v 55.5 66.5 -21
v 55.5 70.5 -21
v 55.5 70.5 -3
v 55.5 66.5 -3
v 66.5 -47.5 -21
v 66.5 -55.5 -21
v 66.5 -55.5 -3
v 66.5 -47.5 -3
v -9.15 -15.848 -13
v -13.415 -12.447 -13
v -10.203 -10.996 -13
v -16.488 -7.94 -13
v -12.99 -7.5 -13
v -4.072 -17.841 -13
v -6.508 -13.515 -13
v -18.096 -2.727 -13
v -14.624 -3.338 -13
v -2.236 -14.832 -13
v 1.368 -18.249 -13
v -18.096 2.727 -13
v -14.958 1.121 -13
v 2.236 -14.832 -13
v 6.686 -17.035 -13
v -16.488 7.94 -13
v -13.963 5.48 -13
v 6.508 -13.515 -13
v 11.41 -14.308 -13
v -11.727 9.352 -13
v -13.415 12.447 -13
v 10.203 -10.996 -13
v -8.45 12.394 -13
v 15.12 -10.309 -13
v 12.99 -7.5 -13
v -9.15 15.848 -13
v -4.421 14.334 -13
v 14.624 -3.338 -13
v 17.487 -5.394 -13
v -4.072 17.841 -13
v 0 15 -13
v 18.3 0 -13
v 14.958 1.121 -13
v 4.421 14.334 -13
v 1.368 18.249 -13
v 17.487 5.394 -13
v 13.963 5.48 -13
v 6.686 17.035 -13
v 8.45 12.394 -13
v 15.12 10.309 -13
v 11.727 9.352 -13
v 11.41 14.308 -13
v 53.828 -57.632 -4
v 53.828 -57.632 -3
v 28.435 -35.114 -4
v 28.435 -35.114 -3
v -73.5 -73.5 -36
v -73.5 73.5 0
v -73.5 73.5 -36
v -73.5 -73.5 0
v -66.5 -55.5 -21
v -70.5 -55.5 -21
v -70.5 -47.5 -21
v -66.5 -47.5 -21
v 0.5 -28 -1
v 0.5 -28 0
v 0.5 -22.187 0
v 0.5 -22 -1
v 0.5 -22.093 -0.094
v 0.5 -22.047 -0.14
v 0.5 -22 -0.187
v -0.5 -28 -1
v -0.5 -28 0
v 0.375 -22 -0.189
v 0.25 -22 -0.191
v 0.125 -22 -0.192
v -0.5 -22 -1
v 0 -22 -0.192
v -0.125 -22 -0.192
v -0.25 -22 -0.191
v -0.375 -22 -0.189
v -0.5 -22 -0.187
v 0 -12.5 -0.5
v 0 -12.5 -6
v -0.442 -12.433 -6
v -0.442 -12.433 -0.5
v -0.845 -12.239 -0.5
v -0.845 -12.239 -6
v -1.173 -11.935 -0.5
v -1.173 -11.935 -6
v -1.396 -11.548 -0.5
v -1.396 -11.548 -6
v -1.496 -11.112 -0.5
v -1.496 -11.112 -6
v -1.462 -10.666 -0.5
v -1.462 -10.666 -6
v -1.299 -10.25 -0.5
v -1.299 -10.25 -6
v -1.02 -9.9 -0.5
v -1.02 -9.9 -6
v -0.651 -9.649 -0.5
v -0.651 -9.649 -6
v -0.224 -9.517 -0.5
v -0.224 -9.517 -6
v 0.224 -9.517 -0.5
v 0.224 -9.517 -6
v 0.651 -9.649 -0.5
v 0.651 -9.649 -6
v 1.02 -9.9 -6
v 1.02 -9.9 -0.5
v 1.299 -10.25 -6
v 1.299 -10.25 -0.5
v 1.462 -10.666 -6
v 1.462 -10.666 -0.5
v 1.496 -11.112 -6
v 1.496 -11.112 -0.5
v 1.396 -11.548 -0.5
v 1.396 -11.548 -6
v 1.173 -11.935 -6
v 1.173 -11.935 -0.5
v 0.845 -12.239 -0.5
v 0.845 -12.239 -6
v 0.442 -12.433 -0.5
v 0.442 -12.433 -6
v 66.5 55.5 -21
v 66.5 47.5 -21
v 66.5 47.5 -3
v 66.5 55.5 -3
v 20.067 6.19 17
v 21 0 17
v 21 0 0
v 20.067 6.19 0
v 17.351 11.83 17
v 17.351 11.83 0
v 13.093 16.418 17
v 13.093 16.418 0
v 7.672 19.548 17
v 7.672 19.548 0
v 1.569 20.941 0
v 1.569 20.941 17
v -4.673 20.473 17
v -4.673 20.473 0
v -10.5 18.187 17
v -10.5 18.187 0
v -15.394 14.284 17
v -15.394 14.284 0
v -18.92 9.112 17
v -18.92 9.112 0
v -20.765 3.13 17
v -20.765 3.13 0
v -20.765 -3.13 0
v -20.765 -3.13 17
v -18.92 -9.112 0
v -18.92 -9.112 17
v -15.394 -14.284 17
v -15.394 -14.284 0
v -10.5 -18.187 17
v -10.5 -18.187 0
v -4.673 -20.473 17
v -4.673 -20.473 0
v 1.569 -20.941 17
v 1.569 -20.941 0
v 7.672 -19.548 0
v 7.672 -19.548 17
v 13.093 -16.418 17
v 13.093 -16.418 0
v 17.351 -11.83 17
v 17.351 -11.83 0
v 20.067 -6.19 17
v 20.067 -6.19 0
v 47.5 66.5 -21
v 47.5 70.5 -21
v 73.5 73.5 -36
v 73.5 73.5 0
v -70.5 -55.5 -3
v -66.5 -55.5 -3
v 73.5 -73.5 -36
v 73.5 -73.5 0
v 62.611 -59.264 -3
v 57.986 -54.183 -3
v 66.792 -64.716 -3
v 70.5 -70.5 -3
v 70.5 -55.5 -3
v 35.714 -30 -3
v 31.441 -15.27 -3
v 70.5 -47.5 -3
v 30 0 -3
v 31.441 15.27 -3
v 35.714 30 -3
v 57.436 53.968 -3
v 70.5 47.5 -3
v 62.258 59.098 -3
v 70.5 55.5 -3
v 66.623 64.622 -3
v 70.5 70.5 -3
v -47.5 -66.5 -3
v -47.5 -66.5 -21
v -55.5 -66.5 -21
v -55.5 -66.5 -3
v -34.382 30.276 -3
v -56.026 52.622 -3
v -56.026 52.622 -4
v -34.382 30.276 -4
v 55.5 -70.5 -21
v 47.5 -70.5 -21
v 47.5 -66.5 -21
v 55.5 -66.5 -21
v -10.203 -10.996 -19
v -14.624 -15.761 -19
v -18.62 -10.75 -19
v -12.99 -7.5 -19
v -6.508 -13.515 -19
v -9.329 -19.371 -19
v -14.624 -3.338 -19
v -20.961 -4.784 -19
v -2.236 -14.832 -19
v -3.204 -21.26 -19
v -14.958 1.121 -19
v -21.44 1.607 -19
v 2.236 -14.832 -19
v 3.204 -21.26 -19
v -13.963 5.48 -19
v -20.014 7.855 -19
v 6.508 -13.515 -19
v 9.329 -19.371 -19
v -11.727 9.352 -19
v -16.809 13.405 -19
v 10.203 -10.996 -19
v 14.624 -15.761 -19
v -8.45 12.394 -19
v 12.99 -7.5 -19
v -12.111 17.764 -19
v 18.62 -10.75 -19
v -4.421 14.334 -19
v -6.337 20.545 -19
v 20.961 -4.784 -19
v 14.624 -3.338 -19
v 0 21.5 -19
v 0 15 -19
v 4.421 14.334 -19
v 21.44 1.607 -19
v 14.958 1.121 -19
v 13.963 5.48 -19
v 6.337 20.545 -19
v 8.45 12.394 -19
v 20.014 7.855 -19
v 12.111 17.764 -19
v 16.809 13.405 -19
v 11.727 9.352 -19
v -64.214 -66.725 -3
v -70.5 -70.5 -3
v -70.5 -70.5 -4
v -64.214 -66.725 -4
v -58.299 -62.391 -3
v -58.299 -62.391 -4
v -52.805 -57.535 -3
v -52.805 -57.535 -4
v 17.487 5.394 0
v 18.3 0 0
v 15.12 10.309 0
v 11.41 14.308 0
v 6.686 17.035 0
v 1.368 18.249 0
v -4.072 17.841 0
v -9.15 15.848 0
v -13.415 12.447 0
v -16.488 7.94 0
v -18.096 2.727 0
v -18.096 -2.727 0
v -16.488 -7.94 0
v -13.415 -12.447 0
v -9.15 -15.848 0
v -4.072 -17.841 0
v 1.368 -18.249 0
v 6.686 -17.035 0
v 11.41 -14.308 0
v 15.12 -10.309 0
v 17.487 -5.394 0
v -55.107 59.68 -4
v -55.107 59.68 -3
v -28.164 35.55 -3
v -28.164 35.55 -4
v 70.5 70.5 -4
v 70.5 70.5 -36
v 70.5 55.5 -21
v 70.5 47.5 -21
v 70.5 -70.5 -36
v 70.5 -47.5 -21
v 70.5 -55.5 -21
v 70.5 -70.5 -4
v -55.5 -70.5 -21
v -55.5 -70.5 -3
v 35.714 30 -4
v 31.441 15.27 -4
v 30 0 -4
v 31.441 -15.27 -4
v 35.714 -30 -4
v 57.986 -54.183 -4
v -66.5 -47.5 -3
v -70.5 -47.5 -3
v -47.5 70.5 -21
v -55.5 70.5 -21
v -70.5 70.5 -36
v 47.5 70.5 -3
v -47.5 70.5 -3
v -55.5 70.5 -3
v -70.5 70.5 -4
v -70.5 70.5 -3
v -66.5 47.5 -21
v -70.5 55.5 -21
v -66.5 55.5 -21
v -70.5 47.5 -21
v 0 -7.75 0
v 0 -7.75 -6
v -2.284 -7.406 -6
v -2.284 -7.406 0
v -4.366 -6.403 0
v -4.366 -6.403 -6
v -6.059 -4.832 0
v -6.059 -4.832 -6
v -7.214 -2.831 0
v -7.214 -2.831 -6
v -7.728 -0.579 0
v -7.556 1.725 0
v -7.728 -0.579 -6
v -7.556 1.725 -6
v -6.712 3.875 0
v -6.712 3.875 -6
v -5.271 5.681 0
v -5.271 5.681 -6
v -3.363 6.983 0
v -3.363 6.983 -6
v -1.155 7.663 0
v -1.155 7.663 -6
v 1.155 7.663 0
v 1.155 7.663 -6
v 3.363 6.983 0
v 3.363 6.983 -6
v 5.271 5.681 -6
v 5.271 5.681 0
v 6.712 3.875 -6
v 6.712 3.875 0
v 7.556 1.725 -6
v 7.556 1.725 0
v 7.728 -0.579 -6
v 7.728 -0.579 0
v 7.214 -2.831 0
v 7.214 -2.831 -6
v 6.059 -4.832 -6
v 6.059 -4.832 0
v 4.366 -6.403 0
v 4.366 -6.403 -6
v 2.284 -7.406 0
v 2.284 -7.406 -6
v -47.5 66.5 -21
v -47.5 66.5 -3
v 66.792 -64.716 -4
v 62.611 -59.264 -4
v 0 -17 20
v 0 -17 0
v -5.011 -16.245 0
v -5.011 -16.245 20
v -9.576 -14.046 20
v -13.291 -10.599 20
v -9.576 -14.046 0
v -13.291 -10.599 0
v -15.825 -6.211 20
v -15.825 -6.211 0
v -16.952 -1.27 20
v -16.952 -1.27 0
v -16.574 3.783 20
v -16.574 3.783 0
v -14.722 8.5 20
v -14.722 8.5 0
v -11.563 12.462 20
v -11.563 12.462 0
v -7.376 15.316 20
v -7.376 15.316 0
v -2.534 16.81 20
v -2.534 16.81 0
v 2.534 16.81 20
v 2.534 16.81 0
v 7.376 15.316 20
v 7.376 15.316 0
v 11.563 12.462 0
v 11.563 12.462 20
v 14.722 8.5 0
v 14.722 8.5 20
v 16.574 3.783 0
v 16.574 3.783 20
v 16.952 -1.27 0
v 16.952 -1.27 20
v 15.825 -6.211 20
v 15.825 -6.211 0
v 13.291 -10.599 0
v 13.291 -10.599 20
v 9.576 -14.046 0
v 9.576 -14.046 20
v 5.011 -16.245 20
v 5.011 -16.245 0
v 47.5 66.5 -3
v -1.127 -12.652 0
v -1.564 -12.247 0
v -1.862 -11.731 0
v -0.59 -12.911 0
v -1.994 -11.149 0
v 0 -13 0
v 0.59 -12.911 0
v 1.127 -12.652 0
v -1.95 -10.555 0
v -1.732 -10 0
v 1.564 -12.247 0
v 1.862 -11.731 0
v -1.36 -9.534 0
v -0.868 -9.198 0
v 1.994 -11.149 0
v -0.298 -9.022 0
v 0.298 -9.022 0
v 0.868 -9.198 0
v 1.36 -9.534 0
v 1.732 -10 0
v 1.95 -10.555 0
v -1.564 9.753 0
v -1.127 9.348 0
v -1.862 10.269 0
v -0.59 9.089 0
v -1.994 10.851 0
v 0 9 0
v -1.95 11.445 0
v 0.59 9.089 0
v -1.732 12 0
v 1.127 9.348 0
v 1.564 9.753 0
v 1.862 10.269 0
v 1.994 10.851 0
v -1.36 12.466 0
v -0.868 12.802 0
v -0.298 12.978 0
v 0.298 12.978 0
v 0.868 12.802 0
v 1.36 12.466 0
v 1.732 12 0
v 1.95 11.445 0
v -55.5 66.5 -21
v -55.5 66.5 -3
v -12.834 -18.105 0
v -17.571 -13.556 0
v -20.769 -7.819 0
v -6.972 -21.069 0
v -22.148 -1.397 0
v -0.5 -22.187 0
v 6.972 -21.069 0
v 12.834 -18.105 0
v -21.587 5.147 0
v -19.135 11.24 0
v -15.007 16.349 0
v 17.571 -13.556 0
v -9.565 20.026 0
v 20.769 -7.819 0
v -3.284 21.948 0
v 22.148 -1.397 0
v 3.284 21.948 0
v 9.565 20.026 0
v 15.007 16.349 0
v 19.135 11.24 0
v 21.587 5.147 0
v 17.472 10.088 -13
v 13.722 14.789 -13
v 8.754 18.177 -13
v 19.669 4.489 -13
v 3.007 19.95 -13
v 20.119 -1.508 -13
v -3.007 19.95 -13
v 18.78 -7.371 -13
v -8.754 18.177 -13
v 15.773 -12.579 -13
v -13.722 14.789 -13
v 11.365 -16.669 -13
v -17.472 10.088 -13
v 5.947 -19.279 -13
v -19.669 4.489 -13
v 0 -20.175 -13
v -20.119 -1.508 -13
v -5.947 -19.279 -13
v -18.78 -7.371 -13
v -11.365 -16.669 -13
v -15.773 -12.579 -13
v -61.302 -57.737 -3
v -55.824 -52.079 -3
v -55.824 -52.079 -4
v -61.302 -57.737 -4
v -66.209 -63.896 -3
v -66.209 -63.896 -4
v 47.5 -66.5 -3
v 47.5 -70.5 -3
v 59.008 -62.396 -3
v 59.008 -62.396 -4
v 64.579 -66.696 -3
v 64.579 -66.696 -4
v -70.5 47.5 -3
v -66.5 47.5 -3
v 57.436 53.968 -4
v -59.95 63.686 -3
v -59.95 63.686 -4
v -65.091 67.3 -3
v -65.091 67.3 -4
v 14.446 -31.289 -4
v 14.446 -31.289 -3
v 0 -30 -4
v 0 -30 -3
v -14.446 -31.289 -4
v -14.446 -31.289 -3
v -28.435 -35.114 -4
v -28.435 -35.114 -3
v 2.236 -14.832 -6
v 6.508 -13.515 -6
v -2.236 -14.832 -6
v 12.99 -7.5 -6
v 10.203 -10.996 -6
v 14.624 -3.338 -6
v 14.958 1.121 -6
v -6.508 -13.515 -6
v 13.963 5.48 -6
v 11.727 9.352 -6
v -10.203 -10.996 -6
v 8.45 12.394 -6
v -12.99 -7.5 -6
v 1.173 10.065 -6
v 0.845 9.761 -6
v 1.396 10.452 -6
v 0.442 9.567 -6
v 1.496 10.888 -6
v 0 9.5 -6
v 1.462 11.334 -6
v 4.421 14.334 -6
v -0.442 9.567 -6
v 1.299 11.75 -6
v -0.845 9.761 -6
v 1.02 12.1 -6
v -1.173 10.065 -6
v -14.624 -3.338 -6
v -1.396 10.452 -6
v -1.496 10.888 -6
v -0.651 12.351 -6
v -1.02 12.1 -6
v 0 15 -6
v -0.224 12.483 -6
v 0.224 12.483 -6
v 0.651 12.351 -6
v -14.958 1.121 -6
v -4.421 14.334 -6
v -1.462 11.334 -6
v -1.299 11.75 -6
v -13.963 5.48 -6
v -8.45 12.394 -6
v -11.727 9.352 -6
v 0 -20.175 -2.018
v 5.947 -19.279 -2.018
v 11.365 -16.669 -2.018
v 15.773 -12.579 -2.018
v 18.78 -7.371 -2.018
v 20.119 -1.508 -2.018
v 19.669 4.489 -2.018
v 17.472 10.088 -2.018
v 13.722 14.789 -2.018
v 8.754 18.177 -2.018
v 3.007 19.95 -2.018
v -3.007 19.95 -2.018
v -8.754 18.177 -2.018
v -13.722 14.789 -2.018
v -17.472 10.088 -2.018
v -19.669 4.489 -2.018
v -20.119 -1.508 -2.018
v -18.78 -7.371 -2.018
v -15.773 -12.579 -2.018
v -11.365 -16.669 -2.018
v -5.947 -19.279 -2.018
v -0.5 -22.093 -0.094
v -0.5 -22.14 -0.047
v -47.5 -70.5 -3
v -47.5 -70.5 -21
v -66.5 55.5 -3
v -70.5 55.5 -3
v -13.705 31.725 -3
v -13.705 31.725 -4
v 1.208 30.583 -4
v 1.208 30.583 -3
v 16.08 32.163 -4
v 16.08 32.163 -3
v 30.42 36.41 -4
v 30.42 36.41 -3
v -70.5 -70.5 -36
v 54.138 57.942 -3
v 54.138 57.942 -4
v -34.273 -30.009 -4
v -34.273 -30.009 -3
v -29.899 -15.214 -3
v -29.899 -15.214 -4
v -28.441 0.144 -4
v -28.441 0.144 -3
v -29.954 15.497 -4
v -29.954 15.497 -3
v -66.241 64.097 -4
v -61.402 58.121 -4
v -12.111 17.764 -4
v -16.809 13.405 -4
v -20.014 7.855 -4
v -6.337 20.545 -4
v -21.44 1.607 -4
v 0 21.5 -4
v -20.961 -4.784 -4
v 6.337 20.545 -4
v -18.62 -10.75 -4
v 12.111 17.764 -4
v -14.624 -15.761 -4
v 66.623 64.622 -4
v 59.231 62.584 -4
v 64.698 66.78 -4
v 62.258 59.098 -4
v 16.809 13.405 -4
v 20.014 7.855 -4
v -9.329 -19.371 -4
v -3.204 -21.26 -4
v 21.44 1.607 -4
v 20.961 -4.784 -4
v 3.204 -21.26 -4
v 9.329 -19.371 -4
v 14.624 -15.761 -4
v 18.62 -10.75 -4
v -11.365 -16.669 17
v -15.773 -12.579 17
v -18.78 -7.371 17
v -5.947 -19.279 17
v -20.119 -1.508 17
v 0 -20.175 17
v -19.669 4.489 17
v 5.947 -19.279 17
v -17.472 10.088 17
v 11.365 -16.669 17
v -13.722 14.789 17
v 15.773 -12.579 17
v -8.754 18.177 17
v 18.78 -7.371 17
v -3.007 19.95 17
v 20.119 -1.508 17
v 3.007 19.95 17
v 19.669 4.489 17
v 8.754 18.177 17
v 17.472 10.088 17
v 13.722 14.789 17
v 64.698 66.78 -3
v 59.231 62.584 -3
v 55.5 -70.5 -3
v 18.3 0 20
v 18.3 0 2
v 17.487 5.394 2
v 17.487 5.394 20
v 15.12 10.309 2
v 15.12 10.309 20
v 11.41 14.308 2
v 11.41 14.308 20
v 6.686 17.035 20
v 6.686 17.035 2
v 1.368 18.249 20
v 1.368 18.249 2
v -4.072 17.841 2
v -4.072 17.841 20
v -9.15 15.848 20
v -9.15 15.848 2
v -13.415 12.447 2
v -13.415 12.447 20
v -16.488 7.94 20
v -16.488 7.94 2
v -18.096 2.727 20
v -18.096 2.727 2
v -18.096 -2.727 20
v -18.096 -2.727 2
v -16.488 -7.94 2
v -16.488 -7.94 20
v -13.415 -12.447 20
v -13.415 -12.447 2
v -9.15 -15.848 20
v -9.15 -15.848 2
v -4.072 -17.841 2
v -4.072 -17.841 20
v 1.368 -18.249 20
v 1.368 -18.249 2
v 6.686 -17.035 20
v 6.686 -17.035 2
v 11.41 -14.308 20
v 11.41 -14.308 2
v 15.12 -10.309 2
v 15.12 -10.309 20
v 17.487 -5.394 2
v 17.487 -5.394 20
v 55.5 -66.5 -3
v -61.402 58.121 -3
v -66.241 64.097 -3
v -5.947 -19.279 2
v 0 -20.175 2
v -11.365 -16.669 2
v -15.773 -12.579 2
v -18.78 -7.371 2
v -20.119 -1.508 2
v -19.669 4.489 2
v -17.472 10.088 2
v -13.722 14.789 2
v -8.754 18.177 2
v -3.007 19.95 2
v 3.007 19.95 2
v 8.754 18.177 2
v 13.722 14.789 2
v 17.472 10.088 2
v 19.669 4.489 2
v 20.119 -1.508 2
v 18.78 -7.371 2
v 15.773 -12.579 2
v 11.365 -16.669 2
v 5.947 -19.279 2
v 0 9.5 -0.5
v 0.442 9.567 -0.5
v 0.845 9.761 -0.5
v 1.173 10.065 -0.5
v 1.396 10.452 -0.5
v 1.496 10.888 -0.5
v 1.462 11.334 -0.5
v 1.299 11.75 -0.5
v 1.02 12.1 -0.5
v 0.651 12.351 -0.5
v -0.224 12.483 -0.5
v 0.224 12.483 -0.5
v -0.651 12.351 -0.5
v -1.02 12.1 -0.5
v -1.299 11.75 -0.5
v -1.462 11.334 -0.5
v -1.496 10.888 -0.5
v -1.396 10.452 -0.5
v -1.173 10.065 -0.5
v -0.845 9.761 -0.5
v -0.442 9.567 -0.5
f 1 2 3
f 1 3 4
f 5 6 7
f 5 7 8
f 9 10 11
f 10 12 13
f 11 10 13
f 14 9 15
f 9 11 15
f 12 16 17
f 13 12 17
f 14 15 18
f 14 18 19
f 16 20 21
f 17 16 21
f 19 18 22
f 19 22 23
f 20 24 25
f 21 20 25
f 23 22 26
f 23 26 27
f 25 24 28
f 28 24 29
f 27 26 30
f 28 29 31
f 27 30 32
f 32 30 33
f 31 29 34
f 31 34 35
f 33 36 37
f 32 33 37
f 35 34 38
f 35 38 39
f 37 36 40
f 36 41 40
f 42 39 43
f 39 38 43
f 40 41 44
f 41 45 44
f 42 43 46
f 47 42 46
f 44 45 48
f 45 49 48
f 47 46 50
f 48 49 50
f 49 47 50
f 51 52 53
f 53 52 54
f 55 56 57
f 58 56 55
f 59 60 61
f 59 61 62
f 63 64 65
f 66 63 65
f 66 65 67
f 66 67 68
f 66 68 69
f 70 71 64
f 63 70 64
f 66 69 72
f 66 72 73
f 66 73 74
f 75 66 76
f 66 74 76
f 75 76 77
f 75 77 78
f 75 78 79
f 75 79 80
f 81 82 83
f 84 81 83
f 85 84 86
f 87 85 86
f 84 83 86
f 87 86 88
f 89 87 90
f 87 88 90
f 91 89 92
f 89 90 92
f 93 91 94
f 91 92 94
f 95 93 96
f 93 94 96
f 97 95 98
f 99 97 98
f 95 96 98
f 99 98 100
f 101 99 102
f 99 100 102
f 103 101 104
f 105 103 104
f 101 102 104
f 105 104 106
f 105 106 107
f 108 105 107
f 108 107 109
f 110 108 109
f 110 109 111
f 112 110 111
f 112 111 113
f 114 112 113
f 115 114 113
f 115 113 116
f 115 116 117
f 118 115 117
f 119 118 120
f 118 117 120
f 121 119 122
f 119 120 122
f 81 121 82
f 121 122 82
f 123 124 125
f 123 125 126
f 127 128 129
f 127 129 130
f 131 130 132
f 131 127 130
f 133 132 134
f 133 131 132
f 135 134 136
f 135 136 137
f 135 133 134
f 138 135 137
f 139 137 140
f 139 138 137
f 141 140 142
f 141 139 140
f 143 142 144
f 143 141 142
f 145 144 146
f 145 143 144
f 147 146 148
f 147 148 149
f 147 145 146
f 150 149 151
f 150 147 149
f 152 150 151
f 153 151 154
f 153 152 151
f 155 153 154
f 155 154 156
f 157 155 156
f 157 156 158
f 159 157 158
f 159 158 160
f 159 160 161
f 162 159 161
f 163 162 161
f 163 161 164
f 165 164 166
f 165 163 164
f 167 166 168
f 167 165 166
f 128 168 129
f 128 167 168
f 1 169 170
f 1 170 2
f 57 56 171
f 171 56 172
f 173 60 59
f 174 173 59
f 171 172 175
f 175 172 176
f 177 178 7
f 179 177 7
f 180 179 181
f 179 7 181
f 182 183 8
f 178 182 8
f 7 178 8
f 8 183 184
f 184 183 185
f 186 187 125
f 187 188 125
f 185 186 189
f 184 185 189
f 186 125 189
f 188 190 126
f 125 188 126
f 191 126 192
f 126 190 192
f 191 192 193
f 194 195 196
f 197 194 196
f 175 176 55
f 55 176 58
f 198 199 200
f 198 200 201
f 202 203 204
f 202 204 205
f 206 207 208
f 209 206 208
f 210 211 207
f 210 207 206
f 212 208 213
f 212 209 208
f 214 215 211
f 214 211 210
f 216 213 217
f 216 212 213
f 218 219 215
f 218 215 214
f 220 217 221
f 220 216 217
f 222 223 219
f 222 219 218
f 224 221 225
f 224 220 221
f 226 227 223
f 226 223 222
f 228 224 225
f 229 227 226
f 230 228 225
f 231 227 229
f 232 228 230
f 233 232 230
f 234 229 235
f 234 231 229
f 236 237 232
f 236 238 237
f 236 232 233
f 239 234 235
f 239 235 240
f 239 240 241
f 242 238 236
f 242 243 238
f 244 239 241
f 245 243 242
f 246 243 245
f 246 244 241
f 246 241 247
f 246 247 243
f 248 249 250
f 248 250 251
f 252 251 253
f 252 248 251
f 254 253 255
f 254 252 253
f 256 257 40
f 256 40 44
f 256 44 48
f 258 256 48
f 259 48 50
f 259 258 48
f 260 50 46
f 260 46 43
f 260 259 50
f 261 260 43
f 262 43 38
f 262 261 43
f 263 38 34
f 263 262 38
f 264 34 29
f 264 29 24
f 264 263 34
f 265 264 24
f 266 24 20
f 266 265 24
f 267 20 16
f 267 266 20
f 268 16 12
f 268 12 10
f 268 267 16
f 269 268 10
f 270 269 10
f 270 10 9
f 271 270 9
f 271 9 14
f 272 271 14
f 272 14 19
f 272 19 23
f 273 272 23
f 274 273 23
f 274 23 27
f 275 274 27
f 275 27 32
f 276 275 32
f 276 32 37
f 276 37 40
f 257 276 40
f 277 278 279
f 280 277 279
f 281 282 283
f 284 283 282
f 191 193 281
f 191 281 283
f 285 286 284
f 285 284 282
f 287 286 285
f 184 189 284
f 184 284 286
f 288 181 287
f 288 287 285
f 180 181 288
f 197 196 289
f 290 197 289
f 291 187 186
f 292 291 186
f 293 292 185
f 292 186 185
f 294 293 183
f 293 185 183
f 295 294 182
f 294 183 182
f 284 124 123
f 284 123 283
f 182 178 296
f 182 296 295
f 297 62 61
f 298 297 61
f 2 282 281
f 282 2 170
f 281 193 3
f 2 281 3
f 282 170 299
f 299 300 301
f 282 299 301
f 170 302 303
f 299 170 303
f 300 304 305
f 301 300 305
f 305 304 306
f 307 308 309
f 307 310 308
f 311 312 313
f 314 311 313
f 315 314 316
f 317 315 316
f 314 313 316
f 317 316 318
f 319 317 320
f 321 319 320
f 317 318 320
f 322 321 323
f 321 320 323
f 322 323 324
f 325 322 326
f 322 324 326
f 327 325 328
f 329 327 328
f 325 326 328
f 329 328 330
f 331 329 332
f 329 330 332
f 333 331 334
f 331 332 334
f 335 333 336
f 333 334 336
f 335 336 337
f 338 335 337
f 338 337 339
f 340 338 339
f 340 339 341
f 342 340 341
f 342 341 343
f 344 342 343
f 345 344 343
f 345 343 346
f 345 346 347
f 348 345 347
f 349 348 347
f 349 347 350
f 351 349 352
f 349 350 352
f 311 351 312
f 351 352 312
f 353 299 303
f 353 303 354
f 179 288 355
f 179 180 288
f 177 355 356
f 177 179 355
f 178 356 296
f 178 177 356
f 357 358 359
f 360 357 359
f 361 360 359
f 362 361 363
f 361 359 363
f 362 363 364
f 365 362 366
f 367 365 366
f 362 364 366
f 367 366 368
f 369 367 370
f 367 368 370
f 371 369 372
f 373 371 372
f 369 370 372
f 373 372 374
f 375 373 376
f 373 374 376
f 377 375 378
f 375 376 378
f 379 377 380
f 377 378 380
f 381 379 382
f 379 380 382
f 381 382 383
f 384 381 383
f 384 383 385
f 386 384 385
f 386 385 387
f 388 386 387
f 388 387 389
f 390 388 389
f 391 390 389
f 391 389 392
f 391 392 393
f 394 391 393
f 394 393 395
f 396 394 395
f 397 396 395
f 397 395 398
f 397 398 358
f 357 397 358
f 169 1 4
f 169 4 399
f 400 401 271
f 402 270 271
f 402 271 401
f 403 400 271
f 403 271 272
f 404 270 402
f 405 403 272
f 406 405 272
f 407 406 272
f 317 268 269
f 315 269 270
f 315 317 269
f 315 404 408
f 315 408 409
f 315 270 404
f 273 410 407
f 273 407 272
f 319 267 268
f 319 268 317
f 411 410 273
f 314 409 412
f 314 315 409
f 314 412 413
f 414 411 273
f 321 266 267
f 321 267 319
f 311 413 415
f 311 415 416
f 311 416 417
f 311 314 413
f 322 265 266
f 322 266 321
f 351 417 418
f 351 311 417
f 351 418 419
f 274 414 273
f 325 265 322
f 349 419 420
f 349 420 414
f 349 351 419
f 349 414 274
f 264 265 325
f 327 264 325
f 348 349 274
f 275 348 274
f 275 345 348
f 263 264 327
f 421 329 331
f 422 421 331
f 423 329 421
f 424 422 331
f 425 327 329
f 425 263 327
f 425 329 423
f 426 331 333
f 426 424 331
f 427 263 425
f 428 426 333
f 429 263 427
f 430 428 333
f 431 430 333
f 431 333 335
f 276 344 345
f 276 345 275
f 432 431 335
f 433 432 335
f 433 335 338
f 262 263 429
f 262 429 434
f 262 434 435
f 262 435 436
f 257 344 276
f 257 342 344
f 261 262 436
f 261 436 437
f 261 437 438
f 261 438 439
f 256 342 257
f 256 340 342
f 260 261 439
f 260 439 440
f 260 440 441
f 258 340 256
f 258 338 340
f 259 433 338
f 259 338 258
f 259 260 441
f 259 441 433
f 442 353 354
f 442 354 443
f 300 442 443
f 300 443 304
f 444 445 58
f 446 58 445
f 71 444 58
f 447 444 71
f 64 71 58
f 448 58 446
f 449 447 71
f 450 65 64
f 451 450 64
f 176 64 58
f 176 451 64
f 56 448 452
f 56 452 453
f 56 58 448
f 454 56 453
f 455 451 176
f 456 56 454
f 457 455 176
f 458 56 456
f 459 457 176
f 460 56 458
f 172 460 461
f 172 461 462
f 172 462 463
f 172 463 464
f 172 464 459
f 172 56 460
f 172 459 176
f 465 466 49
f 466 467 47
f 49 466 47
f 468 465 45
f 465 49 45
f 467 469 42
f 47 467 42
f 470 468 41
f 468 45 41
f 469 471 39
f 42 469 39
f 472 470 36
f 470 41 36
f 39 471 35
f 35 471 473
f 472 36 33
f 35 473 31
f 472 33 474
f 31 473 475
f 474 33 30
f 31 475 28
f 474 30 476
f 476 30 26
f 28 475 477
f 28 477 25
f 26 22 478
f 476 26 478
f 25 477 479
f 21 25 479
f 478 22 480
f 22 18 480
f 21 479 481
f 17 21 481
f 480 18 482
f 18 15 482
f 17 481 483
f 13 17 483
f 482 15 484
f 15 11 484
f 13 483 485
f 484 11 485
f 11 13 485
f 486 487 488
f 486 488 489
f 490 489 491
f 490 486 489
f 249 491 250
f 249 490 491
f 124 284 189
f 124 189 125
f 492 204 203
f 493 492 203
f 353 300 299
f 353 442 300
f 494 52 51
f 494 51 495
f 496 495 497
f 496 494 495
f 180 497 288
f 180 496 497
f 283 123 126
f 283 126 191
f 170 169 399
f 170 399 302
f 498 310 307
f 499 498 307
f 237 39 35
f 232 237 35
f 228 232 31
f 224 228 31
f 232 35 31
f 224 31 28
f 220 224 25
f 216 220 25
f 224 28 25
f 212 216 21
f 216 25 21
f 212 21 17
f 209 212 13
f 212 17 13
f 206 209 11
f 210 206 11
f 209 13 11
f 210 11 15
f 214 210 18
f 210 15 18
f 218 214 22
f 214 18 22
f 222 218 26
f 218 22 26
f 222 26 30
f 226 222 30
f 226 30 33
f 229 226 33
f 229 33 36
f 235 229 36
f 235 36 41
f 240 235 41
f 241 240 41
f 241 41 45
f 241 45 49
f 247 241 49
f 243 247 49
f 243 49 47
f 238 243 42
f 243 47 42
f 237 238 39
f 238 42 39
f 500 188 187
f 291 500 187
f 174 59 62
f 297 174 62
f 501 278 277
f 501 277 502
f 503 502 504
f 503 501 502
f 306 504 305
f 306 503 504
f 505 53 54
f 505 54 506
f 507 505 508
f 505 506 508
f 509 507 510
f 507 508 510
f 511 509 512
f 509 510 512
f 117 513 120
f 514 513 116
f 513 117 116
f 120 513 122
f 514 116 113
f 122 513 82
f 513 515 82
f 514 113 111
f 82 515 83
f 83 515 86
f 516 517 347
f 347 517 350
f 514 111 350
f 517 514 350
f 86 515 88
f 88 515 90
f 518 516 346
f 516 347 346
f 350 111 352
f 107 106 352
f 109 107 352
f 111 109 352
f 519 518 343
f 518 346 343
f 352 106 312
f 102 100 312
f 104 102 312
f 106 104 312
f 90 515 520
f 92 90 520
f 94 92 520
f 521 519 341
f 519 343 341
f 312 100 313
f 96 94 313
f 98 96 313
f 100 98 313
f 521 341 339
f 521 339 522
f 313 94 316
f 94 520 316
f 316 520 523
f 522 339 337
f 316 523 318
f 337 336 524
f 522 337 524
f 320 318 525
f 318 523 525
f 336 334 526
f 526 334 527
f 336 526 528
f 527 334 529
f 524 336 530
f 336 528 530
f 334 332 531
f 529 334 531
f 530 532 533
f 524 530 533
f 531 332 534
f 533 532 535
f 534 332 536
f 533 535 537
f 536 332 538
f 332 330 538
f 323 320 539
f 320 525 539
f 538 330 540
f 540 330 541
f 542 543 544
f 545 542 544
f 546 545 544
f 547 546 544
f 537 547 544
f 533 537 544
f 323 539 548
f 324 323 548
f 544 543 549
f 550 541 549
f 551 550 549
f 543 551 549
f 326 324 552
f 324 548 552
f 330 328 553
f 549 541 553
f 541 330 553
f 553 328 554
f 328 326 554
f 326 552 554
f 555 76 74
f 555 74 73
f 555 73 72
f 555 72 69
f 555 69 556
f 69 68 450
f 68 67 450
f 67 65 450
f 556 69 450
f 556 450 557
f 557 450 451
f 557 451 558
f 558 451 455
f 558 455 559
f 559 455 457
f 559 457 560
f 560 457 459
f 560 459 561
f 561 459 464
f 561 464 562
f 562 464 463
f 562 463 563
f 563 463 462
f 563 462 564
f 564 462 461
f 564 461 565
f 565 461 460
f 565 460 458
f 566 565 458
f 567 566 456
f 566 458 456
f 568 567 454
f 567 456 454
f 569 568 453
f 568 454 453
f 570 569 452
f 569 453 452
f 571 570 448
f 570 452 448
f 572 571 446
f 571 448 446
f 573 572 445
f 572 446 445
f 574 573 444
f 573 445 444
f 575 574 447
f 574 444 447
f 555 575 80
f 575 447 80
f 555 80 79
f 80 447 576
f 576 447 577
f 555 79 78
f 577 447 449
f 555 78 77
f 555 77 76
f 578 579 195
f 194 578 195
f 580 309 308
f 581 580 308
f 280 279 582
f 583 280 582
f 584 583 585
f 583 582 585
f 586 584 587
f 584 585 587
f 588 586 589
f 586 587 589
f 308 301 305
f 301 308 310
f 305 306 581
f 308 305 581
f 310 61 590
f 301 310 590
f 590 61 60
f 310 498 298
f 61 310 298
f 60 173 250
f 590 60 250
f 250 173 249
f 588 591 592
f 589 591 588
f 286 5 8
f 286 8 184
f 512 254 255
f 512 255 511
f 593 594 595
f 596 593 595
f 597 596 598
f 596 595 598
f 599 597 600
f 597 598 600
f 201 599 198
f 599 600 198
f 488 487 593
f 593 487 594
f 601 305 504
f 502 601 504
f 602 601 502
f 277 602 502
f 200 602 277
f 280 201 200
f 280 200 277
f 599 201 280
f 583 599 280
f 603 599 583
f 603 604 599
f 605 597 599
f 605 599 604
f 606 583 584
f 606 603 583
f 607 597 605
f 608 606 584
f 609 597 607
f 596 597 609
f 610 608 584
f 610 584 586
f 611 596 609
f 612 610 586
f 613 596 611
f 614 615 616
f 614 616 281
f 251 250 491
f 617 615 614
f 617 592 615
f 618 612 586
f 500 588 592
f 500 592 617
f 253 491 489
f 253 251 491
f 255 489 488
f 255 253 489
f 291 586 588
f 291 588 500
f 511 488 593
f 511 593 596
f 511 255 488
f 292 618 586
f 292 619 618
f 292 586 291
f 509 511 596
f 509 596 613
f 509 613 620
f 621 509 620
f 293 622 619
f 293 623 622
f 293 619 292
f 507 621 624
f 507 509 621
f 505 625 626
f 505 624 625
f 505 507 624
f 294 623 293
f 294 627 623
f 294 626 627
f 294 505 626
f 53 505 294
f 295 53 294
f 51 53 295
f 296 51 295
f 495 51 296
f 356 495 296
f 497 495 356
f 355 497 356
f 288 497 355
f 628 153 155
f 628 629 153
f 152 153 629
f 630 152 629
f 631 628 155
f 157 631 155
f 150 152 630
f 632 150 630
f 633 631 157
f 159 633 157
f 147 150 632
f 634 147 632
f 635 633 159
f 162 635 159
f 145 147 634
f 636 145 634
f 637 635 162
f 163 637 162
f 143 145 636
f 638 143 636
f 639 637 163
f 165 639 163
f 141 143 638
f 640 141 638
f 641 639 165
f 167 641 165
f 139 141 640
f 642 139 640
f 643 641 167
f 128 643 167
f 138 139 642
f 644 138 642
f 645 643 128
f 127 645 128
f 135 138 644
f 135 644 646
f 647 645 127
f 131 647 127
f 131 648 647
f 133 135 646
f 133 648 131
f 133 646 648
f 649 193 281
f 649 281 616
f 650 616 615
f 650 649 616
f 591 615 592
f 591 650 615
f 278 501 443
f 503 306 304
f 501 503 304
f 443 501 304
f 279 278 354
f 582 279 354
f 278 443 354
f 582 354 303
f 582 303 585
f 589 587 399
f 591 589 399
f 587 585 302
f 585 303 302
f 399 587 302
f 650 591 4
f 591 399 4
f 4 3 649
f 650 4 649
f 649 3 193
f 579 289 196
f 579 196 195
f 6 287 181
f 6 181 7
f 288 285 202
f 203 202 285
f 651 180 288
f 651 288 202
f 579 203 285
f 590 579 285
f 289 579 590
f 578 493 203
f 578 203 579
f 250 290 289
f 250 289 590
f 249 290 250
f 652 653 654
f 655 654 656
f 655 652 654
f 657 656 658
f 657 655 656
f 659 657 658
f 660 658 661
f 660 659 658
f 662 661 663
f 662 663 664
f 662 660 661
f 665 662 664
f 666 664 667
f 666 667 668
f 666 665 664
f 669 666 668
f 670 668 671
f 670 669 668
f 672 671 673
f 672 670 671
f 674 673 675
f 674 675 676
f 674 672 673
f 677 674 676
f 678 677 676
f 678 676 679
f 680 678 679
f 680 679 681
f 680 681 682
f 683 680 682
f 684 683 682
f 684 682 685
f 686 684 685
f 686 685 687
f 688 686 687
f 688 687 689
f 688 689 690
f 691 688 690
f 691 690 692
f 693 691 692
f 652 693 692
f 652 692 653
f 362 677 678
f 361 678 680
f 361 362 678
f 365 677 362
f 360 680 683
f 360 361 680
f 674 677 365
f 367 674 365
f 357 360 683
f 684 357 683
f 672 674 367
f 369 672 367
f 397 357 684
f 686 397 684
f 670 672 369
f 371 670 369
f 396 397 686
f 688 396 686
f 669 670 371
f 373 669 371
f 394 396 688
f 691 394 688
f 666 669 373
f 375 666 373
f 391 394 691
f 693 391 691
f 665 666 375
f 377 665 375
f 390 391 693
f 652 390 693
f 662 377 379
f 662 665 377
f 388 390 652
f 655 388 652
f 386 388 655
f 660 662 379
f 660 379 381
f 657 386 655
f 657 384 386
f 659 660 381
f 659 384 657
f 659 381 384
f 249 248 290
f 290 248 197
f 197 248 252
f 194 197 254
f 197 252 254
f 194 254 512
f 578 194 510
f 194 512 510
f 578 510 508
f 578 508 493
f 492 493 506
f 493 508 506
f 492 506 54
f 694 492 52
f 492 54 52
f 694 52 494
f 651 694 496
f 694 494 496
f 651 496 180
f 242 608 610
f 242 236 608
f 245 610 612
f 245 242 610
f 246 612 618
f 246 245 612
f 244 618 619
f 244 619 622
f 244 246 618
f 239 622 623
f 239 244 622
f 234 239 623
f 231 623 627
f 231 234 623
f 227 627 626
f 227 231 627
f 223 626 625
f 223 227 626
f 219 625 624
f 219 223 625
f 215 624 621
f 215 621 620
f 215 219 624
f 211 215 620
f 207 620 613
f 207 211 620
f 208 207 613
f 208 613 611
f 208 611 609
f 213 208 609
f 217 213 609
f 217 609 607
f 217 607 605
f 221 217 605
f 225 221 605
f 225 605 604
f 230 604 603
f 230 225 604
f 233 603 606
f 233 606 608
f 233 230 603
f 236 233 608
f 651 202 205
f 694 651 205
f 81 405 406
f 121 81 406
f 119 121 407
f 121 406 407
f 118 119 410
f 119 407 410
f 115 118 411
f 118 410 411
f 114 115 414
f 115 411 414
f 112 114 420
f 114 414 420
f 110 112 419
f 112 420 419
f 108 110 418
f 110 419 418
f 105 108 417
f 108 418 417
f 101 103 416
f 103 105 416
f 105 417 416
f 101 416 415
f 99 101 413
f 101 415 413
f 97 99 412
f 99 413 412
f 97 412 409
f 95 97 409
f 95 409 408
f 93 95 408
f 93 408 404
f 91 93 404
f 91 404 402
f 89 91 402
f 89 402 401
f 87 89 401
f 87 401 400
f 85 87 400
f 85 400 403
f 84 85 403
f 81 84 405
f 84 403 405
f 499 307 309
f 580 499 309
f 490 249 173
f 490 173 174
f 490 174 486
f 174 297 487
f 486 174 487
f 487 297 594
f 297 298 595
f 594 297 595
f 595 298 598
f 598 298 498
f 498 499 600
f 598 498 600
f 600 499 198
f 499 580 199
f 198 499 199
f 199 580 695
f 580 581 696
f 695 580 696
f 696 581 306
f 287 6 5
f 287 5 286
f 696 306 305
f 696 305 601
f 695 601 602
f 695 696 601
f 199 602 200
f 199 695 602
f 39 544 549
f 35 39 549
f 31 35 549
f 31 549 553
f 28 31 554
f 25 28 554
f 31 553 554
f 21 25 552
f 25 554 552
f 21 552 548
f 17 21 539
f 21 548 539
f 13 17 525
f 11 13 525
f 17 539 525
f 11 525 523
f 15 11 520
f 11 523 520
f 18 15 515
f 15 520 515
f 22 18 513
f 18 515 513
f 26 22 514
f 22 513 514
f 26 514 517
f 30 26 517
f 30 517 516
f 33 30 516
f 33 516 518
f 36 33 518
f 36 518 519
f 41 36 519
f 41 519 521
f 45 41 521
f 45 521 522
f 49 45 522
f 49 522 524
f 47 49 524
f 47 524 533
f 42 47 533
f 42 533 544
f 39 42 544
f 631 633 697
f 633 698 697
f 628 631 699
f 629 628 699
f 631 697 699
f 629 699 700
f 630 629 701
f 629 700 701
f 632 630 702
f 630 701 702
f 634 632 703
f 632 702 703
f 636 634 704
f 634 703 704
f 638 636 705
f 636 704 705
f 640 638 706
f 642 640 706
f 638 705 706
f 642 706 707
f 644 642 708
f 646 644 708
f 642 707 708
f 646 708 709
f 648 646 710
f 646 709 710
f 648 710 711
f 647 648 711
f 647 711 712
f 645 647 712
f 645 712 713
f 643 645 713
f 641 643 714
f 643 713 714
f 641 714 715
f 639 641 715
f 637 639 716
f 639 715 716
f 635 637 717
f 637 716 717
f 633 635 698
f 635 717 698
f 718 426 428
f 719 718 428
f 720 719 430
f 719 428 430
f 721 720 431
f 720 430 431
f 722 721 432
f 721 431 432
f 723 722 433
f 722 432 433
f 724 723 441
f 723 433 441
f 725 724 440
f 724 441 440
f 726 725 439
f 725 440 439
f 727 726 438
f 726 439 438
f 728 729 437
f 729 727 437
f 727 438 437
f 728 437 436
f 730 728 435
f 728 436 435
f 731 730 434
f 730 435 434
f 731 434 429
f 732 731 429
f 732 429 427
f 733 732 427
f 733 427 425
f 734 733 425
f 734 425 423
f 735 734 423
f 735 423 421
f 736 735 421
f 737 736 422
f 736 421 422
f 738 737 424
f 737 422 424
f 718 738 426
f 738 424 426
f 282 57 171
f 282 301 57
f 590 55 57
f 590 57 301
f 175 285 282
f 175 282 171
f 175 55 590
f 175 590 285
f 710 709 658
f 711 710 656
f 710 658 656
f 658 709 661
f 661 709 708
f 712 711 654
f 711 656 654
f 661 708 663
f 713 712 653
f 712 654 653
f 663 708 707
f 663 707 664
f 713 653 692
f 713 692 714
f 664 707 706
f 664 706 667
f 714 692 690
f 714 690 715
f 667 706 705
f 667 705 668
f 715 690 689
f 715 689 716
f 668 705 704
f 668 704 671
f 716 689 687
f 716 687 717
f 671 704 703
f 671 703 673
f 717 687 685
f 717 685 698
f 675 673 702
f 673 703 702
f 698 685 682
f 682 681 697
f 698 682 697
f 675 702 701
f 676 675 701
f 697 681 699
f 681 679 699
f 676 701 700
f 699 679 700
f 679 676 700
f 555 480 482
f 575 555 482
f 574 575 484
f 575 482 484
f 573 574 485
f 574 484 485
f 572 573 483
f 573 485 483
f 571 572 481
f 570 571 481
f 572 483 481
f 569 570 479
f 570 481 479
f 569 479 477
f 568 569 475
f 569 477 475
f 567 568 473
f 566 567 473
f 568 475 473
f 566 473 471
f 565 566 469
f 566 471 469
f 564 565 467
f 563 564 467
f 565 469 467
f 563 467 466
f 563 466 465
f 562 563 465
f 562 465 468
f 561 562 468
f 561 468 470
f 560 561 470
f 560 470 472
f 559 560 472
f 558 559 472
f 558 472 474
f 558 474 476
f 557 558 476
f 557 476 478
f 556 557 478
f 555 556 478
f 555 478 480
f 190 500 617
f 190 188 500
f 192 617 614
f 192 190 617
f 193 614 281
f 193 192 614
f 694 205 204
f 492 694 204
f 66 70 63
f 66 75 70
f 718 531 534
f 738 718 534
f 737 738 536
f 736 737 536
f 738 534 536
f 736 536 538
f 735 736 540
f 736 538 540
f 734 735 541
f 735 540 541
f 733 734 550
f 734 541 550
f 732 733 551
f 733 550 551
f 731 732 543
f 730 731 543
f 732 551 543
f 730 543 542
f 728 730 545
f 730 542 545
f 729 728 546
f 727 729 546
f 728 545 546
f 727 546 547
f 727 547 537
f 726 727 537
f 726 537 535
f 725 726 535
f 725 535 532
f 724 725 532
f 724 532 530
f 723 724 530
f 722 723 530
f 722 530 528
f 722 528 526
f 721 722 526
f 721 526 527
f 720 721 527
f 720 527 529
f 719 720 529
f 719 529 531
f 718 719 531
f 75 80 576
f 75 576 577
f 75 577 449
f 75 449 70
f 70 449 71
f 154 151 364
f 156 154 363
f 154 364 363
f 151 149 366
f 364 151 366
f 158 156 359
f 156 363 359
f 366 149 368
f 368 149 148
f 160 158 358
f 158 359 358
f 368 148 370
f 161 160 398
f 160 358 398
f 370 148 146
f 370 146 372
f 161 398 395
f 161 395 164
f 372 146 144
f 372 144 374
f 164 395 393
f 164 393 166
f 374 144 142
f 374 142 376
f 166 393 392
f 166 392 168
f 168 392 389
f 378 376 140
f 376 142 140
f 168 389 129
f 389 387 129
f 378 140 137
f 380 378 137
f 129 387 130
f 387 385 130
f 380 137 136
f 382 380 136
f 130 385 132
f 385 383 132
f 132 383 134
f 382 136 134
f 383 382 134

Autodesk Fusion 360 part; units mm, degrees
sketch "Sketch1" plane through (0, 0, 0) normal (0, 0, 1) x (1, 0, 0)
cylinder "CylinderPrimitive1" add diameter 42 height 2 placed x (1, 0, 0) y (0, 1, 0) z (0, 0, 1) at (0, 0, 0) makes body 1
cylinder "CylinderPrimitive2" add diameter 42 height 15 placed x (1, 0, 0) y (0, 1, 0) z (0, 0, 1) at (0, 0, 2) bodies 1
hole "Hole1" at (0, 0, 17) direction (0, 0, -1) diameter 40.35 depth 15 tip angle 180 bodies 1
cylinder "CylinderPrimitive3" add diameter 36.6 height 20 placed x (1, 0, 0) y (0, 1, 0) z (0, 0, 1) at (0, 0, 0) bodies 1
hole "Hole2" at (0, 0, 20) direction (0, 0, -1) diameter 34 depth 20 tip angle 180 bodies 1
copy_body "Body->Comp1" bodies 1 removing the originals makes body 2 in component "Component"
sketch "Sketch1 (2)" plane through (0, 0, 0) normal (0, 0, 1) x (1, 0, 0) in component "TopCover"
  line L0 (-73.5, -73.5) -> (73.5, -73.5)
  line L1 (73.5, -73.5) -> (73.5, 73.5)
  line L2 (73.5, 73.5) -> (-73.5, 73.5)
  line L3 (-73.5, 73.5) -> (-73.5, -73.5)
  line L4 (-73.5, -73.5) -> (73.5, 73.5) construction
  line L5 (73.5, -73.5) -> (-73.5, 73.5) construction
  dimension "d13" = 147
  dimension "d14" = 147
extrude "Extrude1" add sketch "Sketch1 (2)" against normal blind 3 separate body makes body 3 in component "TopCover"
sketch "Sketch2" plane through (0, 0, -3) normal (0, 0, -1) x (1, 0, 0) in component "TopCover"
  line L0 (-73.5, 73.5) -> (-73.5, -73.5)
  line L1 (-73.5, -73.5) -> (73.5, -73.5)
  line L2 (73.5, -73.5) -> (73.5, 73.5)
  line L3 (73.5, 73.5) -> (-73.5, 73.5)
  line L4 (73.5, -73.5) -> (70.5, -73.5)
  line L5 (70.5, -73.5) -> (70.5, 73.5)
  line L6 (70.5, 73.5) -> (73.5, 73.5)
  line L7 (73.5, 73.5) -> (73.5, -73.5)
  line L8 (-73.5, -73.5) -> (-70.5, -73.5)
  line L9 (-70.5, -73.5) -> (-70.5, 73.5)
  line L10 (-70.5, 73.5) -> (-73.5, 73.5)
  line L11 (-73.5, 73.5) -> (-73.5, -73.5)
  line L12 (-70.5, 73.5) -> (70.5, 73.5)
  line L13 (70.5, 73.5) -> (70.5, 70.5)
  line L14 (70.5, 70.5) -> (-70.5, 70.5)
  line L15 (-70.5, 70.5) -> (-70.5, 73.5)
  line L16 (-70.5, -73.5) -> (70.5, -73.5)
  line L17 (70.5, -73.5) -> (70.5, -70.5)
  line L18 (70.5, -70.5) -> (-70.5, -70.5)
  line L19 (-70.5, -70.5) -> (-70.5, -73.5)
  dimension "d17" = 3
  dimension "d18" = 3
  dimension "d23" = 3
  dimension "d24" = 3
extrude "Extrude2" add sketch "Sketch2" along normal blind 33 contours L0 L1 L3 L8 L9 L10 L11 L15 L19 bodies 3 in component "TopCover"
extrude "Extrude3" add sketch "Sketch2" along normal blind 33 contours L1 L2 L3 L4 L5 L6 L7 L13 L17 bodies 3 in component "TopCover"
extrude "Extrude4" add sketch "Sketch2" along normal blind 33 contours L3 L5 L9 L12 L13 L14 L15 bodies 3 in component "TopCover"
extrude "Extrude5" add sketch "Sketch2" along normal blind 33 contours L1 L5 L9 L16 L17 L18 L19 bodies 3 in component "TopCover"
sketch "Sketch3" plane through (0, 0, -3) normal (0, 0, -1) x (1, 0, 0) in component "TopCover"
  arc A0 (70.5, 70.5) -> (70.5, -70.5) centre (111.6111, 0) ccw
  arc A1 (70.5, -70.5) -> (-70.5, -70.5) centre (0, -112.7814) ccw
  arc A2 (-70.5, -70.5) -> (-70.5, 70.5) centre (-108.5568, 0) ccw
  arc A3 (-70.5, 70.5) -> (70.5, 70.5) centre (0, 111.6111) ccw
  line L0 (-52.8048, 57.5351) -> (-28.4354, 35.114)
  line L1 (53.8282, 57.6325) -> (28.4354, 35.114)
  line L2 (57.9865, 54.1834) -> (35.714, 30)
  line L3 (57.4361, -53.9676) -> (35.714, -30)
  line L4 (54.138, -57.9415) -> (30.4205, -36.4102)
  line L5 (-55.1072, -59.6801) -> (-28.1638, -35.5495)
  line L6 (-56.0257, -52.6225) -> (-34.3817, -30.2758)
  line L7 (-55.8235, 52.0787) -> (-34.2733, 30.0088)
  point P0 (-70.5, 70.5)
  point P1 (70.5, 70.5)
  point P2 (70.5, -70.5)
  point P3 (-70.5, -70.5)
extrude "Extrude6" add sketch "Sketch3" along normal blind 1 separate body makes body 4 in component "TopCover"
cylinder "CylinderPrimitive1'" add diameter 43 height 16 placed x (0, 1, 0) y (1, 0, 0) z (0, 0, -1) at (0, 0, -3) bodies 4 3 in component "TopCover"
hole "Hole3" at (0, 0, 0) direction (0, 0, -1) diameter 40.35 depth 13 tip angle 180 countersink diameter 44.385 countersink angle 90 bodies 4 in component "TopCover"
cylinder "CylinderPrimitive2'" add diameter 36.6 height -13 placed x (1, 0, 0) y (0, 1, 0) z (0, 0, 1) at (0, 0, 0) separate body makes body 5 in component "TopCover"
hole "Hole4" at (0, 0, -19) direction (0, 0, 1) diameter 30 depth 13 tip angle 180 bodies 4 5 in component "TopCover"
sketch "Sketch4" plane through (0, 0, -3) normal (0, 0, -1) x (1, 0, 0) in component "TopCover"
  line L0 (-55.5, 70.5) -> (-47.5, 70.5)
  line L1 (-47.5, 70.5) -> (-47.5, 66.5)
  line L2 (-47.5, 66.5) -> (-55.5, 66.5)
  line L3 (-55.5, 66.5) -> (-55.5, 70.5)
  line L4 (70.5, 70.5) -> (-70.5, 70.5)
  line L5 (55.5, 70.5) -> (55.5, 66.5)
  line L6 (47.5, 70.5) -> (55.5, 70.5)
  line L7 (47.5, 66.5) -> (47.5, 70.5)
  line L8 (55.5, 66.5) -> (47.5, 66.5)
  line L9 (-55.5, -70.5) -> (-47.5, -70.5)
  line L10 (-47.5, -70.5) -> (-47.5, -66.5)
  line L11 (-47.5, -66.5) -> (-55.5, -66.5)
  line L12 (-55.5, -66.5) -> (-55.5, -70.5)
  line L13 (70.5, -70.5) -> (-70.5, -70.5)
  line L14 (47.5, -70.5) -> (55.5, -70.5)
  line L15 (55.5, -70.5) -> (55.5, -66.5)
  line L16 (55.5, -66.5) -> (47.5, -66.5)
  line L17 (47.5, -66.5) -> (47.5, -70.5)
  line L18 (-70.5, 55.5) -> (-66.5, 55.5)
  line L19 (-66.5, 55.5) -> (-66.5, 47.5)
  line L20 (-66.5, 47.5) -> (-70.5, 47.5)
  line L21 (-70.5, 47.5) -> (-70.5, 55.5)
  line L22 (-70.5, -73.5) -> (-70.5, 73.5)
  line L23 (-70.5, -47.5) -> (-66.5, -47.5)
  line L24 (-66.5, -47.5) -> (-66.5, -55.5)
  line L25 (-66.5, -55.5) -> (-70.5, -55.5)
  line L26 (-70.5, -55.5) -> (-70.5, -47.5)
  line L27 (70.5, 55.5) -> (66.5, 55.5)
  line L28 (66.5, 55.5) -> (66.5, 47.5)
  line L29 (66.5, 47.5) -> (70.5, 47.5)
  line L30 (70.5, 47.5) -> (70.5, 55.5)
  line L31 (70.5, -73.5) -> (70.5, 73.5)
  line L32 (70.5, -47.5) -> (66.5, -47.5)
  line L33 (66.5, -47.5) -> (66.5, -55.5)
  line L34 (66.5, -55.5) -> (70.5, -55.5)
  line L35 (70.5, -55.5) -> (70.5, -47.5)
  dimension "d31" = 8
  dimension "d32" = 4
  dimension "d33" = 8
  dimension "d34" = 4
  dimension "d35" = 15
  dimension "d36" = 15
  dimension "d37" = 8
  dimension "d38" = 4
  dimension "d39" = 8
  dimension "d40" = 4
  dimension "d41" = 4
  dimension "d42" = 8
  dimension "d43" = 4
  dimension "d44" = 8
  dimension "d45" = 4
  dimension "d46" = 8
  dimension "d47" = 4
  dimension "d48" = 8
  dimension "d49" = 15
  dimension "d50" = 15
  dimension "d51" = 15
  dimension "d52" = 15
  dimension "d53" = 15
  dimension "d54" = 15
extrude "Extrude7" add sketch "Sketch4" along normal blind 18 contours L0 L1 L2 L3 L4 | L4 L5 L6 L7 L8 | L18 L19 L20 L21 L22 | L22 L23 L24 L25 L26 | L27 L28 L29 L30 L31 | L31 L32 L33 L34 L35 | L9 L10 L11 L12 L13 | L13 L14 L15 L16 L17 bodies 4 in component "TopCover"
hole "Hole1'" at (0, 0, 0) direction (0, 0, -1) diameter 15.5 depth 10 tip angle 180 bodies 5 in component "TopCover"
sketch "Sketch5" plane through (0, 0, 0) normal (0, 0, 1) x (1, 0, 0) in component "TopCover"
  point P0 (0, -11)
  point P1 (0, 11)
  dimension "d60" = 11
  dimension "d61" = 11
hole "Hole2'" at (0, 11, 0) at (0, -11, 0) direction (0, 0, -1) diameter 3 depth 6 tip angle 180 countersink diameter 4 countersink angle 90 bodies 5 in component "TopCover"
sketch "Sketch9" plane through (0, 0, 0) normal (0, 0, 1) x (1, 0, 0) in component "TopCover"
  line L0 (0.5, -22) -> (-0.5, -22)
  line L1 (-0.5, -22) -> (-0.5, -28)
  line L2 (-0.5, -28) -> (0.5, -28)
  line L3 (0.5, -28) -> (0.5, -22)
  line L4 (0.5, -22) -> (-0.5, -28) construction
  line L5 (-0.5, -22) -> (0.5, -28) construction
  point P0 (0, -25)
  dimension "d79" = 1
  dimension "d80" = 6
extrude "Extrude8" cut sketch "Sketch9" against normal blind 1 bodies 4 in component "TopCover"
component "TopCover" placed x (1, 0, 0) y (0, 1, 0) z (0, 0, 1) at (0, 0, 0)
component "Component" placed x (1, 0, 0) y (0, 1, 0) z (0, 0, 1) at (0, 0, 0)
